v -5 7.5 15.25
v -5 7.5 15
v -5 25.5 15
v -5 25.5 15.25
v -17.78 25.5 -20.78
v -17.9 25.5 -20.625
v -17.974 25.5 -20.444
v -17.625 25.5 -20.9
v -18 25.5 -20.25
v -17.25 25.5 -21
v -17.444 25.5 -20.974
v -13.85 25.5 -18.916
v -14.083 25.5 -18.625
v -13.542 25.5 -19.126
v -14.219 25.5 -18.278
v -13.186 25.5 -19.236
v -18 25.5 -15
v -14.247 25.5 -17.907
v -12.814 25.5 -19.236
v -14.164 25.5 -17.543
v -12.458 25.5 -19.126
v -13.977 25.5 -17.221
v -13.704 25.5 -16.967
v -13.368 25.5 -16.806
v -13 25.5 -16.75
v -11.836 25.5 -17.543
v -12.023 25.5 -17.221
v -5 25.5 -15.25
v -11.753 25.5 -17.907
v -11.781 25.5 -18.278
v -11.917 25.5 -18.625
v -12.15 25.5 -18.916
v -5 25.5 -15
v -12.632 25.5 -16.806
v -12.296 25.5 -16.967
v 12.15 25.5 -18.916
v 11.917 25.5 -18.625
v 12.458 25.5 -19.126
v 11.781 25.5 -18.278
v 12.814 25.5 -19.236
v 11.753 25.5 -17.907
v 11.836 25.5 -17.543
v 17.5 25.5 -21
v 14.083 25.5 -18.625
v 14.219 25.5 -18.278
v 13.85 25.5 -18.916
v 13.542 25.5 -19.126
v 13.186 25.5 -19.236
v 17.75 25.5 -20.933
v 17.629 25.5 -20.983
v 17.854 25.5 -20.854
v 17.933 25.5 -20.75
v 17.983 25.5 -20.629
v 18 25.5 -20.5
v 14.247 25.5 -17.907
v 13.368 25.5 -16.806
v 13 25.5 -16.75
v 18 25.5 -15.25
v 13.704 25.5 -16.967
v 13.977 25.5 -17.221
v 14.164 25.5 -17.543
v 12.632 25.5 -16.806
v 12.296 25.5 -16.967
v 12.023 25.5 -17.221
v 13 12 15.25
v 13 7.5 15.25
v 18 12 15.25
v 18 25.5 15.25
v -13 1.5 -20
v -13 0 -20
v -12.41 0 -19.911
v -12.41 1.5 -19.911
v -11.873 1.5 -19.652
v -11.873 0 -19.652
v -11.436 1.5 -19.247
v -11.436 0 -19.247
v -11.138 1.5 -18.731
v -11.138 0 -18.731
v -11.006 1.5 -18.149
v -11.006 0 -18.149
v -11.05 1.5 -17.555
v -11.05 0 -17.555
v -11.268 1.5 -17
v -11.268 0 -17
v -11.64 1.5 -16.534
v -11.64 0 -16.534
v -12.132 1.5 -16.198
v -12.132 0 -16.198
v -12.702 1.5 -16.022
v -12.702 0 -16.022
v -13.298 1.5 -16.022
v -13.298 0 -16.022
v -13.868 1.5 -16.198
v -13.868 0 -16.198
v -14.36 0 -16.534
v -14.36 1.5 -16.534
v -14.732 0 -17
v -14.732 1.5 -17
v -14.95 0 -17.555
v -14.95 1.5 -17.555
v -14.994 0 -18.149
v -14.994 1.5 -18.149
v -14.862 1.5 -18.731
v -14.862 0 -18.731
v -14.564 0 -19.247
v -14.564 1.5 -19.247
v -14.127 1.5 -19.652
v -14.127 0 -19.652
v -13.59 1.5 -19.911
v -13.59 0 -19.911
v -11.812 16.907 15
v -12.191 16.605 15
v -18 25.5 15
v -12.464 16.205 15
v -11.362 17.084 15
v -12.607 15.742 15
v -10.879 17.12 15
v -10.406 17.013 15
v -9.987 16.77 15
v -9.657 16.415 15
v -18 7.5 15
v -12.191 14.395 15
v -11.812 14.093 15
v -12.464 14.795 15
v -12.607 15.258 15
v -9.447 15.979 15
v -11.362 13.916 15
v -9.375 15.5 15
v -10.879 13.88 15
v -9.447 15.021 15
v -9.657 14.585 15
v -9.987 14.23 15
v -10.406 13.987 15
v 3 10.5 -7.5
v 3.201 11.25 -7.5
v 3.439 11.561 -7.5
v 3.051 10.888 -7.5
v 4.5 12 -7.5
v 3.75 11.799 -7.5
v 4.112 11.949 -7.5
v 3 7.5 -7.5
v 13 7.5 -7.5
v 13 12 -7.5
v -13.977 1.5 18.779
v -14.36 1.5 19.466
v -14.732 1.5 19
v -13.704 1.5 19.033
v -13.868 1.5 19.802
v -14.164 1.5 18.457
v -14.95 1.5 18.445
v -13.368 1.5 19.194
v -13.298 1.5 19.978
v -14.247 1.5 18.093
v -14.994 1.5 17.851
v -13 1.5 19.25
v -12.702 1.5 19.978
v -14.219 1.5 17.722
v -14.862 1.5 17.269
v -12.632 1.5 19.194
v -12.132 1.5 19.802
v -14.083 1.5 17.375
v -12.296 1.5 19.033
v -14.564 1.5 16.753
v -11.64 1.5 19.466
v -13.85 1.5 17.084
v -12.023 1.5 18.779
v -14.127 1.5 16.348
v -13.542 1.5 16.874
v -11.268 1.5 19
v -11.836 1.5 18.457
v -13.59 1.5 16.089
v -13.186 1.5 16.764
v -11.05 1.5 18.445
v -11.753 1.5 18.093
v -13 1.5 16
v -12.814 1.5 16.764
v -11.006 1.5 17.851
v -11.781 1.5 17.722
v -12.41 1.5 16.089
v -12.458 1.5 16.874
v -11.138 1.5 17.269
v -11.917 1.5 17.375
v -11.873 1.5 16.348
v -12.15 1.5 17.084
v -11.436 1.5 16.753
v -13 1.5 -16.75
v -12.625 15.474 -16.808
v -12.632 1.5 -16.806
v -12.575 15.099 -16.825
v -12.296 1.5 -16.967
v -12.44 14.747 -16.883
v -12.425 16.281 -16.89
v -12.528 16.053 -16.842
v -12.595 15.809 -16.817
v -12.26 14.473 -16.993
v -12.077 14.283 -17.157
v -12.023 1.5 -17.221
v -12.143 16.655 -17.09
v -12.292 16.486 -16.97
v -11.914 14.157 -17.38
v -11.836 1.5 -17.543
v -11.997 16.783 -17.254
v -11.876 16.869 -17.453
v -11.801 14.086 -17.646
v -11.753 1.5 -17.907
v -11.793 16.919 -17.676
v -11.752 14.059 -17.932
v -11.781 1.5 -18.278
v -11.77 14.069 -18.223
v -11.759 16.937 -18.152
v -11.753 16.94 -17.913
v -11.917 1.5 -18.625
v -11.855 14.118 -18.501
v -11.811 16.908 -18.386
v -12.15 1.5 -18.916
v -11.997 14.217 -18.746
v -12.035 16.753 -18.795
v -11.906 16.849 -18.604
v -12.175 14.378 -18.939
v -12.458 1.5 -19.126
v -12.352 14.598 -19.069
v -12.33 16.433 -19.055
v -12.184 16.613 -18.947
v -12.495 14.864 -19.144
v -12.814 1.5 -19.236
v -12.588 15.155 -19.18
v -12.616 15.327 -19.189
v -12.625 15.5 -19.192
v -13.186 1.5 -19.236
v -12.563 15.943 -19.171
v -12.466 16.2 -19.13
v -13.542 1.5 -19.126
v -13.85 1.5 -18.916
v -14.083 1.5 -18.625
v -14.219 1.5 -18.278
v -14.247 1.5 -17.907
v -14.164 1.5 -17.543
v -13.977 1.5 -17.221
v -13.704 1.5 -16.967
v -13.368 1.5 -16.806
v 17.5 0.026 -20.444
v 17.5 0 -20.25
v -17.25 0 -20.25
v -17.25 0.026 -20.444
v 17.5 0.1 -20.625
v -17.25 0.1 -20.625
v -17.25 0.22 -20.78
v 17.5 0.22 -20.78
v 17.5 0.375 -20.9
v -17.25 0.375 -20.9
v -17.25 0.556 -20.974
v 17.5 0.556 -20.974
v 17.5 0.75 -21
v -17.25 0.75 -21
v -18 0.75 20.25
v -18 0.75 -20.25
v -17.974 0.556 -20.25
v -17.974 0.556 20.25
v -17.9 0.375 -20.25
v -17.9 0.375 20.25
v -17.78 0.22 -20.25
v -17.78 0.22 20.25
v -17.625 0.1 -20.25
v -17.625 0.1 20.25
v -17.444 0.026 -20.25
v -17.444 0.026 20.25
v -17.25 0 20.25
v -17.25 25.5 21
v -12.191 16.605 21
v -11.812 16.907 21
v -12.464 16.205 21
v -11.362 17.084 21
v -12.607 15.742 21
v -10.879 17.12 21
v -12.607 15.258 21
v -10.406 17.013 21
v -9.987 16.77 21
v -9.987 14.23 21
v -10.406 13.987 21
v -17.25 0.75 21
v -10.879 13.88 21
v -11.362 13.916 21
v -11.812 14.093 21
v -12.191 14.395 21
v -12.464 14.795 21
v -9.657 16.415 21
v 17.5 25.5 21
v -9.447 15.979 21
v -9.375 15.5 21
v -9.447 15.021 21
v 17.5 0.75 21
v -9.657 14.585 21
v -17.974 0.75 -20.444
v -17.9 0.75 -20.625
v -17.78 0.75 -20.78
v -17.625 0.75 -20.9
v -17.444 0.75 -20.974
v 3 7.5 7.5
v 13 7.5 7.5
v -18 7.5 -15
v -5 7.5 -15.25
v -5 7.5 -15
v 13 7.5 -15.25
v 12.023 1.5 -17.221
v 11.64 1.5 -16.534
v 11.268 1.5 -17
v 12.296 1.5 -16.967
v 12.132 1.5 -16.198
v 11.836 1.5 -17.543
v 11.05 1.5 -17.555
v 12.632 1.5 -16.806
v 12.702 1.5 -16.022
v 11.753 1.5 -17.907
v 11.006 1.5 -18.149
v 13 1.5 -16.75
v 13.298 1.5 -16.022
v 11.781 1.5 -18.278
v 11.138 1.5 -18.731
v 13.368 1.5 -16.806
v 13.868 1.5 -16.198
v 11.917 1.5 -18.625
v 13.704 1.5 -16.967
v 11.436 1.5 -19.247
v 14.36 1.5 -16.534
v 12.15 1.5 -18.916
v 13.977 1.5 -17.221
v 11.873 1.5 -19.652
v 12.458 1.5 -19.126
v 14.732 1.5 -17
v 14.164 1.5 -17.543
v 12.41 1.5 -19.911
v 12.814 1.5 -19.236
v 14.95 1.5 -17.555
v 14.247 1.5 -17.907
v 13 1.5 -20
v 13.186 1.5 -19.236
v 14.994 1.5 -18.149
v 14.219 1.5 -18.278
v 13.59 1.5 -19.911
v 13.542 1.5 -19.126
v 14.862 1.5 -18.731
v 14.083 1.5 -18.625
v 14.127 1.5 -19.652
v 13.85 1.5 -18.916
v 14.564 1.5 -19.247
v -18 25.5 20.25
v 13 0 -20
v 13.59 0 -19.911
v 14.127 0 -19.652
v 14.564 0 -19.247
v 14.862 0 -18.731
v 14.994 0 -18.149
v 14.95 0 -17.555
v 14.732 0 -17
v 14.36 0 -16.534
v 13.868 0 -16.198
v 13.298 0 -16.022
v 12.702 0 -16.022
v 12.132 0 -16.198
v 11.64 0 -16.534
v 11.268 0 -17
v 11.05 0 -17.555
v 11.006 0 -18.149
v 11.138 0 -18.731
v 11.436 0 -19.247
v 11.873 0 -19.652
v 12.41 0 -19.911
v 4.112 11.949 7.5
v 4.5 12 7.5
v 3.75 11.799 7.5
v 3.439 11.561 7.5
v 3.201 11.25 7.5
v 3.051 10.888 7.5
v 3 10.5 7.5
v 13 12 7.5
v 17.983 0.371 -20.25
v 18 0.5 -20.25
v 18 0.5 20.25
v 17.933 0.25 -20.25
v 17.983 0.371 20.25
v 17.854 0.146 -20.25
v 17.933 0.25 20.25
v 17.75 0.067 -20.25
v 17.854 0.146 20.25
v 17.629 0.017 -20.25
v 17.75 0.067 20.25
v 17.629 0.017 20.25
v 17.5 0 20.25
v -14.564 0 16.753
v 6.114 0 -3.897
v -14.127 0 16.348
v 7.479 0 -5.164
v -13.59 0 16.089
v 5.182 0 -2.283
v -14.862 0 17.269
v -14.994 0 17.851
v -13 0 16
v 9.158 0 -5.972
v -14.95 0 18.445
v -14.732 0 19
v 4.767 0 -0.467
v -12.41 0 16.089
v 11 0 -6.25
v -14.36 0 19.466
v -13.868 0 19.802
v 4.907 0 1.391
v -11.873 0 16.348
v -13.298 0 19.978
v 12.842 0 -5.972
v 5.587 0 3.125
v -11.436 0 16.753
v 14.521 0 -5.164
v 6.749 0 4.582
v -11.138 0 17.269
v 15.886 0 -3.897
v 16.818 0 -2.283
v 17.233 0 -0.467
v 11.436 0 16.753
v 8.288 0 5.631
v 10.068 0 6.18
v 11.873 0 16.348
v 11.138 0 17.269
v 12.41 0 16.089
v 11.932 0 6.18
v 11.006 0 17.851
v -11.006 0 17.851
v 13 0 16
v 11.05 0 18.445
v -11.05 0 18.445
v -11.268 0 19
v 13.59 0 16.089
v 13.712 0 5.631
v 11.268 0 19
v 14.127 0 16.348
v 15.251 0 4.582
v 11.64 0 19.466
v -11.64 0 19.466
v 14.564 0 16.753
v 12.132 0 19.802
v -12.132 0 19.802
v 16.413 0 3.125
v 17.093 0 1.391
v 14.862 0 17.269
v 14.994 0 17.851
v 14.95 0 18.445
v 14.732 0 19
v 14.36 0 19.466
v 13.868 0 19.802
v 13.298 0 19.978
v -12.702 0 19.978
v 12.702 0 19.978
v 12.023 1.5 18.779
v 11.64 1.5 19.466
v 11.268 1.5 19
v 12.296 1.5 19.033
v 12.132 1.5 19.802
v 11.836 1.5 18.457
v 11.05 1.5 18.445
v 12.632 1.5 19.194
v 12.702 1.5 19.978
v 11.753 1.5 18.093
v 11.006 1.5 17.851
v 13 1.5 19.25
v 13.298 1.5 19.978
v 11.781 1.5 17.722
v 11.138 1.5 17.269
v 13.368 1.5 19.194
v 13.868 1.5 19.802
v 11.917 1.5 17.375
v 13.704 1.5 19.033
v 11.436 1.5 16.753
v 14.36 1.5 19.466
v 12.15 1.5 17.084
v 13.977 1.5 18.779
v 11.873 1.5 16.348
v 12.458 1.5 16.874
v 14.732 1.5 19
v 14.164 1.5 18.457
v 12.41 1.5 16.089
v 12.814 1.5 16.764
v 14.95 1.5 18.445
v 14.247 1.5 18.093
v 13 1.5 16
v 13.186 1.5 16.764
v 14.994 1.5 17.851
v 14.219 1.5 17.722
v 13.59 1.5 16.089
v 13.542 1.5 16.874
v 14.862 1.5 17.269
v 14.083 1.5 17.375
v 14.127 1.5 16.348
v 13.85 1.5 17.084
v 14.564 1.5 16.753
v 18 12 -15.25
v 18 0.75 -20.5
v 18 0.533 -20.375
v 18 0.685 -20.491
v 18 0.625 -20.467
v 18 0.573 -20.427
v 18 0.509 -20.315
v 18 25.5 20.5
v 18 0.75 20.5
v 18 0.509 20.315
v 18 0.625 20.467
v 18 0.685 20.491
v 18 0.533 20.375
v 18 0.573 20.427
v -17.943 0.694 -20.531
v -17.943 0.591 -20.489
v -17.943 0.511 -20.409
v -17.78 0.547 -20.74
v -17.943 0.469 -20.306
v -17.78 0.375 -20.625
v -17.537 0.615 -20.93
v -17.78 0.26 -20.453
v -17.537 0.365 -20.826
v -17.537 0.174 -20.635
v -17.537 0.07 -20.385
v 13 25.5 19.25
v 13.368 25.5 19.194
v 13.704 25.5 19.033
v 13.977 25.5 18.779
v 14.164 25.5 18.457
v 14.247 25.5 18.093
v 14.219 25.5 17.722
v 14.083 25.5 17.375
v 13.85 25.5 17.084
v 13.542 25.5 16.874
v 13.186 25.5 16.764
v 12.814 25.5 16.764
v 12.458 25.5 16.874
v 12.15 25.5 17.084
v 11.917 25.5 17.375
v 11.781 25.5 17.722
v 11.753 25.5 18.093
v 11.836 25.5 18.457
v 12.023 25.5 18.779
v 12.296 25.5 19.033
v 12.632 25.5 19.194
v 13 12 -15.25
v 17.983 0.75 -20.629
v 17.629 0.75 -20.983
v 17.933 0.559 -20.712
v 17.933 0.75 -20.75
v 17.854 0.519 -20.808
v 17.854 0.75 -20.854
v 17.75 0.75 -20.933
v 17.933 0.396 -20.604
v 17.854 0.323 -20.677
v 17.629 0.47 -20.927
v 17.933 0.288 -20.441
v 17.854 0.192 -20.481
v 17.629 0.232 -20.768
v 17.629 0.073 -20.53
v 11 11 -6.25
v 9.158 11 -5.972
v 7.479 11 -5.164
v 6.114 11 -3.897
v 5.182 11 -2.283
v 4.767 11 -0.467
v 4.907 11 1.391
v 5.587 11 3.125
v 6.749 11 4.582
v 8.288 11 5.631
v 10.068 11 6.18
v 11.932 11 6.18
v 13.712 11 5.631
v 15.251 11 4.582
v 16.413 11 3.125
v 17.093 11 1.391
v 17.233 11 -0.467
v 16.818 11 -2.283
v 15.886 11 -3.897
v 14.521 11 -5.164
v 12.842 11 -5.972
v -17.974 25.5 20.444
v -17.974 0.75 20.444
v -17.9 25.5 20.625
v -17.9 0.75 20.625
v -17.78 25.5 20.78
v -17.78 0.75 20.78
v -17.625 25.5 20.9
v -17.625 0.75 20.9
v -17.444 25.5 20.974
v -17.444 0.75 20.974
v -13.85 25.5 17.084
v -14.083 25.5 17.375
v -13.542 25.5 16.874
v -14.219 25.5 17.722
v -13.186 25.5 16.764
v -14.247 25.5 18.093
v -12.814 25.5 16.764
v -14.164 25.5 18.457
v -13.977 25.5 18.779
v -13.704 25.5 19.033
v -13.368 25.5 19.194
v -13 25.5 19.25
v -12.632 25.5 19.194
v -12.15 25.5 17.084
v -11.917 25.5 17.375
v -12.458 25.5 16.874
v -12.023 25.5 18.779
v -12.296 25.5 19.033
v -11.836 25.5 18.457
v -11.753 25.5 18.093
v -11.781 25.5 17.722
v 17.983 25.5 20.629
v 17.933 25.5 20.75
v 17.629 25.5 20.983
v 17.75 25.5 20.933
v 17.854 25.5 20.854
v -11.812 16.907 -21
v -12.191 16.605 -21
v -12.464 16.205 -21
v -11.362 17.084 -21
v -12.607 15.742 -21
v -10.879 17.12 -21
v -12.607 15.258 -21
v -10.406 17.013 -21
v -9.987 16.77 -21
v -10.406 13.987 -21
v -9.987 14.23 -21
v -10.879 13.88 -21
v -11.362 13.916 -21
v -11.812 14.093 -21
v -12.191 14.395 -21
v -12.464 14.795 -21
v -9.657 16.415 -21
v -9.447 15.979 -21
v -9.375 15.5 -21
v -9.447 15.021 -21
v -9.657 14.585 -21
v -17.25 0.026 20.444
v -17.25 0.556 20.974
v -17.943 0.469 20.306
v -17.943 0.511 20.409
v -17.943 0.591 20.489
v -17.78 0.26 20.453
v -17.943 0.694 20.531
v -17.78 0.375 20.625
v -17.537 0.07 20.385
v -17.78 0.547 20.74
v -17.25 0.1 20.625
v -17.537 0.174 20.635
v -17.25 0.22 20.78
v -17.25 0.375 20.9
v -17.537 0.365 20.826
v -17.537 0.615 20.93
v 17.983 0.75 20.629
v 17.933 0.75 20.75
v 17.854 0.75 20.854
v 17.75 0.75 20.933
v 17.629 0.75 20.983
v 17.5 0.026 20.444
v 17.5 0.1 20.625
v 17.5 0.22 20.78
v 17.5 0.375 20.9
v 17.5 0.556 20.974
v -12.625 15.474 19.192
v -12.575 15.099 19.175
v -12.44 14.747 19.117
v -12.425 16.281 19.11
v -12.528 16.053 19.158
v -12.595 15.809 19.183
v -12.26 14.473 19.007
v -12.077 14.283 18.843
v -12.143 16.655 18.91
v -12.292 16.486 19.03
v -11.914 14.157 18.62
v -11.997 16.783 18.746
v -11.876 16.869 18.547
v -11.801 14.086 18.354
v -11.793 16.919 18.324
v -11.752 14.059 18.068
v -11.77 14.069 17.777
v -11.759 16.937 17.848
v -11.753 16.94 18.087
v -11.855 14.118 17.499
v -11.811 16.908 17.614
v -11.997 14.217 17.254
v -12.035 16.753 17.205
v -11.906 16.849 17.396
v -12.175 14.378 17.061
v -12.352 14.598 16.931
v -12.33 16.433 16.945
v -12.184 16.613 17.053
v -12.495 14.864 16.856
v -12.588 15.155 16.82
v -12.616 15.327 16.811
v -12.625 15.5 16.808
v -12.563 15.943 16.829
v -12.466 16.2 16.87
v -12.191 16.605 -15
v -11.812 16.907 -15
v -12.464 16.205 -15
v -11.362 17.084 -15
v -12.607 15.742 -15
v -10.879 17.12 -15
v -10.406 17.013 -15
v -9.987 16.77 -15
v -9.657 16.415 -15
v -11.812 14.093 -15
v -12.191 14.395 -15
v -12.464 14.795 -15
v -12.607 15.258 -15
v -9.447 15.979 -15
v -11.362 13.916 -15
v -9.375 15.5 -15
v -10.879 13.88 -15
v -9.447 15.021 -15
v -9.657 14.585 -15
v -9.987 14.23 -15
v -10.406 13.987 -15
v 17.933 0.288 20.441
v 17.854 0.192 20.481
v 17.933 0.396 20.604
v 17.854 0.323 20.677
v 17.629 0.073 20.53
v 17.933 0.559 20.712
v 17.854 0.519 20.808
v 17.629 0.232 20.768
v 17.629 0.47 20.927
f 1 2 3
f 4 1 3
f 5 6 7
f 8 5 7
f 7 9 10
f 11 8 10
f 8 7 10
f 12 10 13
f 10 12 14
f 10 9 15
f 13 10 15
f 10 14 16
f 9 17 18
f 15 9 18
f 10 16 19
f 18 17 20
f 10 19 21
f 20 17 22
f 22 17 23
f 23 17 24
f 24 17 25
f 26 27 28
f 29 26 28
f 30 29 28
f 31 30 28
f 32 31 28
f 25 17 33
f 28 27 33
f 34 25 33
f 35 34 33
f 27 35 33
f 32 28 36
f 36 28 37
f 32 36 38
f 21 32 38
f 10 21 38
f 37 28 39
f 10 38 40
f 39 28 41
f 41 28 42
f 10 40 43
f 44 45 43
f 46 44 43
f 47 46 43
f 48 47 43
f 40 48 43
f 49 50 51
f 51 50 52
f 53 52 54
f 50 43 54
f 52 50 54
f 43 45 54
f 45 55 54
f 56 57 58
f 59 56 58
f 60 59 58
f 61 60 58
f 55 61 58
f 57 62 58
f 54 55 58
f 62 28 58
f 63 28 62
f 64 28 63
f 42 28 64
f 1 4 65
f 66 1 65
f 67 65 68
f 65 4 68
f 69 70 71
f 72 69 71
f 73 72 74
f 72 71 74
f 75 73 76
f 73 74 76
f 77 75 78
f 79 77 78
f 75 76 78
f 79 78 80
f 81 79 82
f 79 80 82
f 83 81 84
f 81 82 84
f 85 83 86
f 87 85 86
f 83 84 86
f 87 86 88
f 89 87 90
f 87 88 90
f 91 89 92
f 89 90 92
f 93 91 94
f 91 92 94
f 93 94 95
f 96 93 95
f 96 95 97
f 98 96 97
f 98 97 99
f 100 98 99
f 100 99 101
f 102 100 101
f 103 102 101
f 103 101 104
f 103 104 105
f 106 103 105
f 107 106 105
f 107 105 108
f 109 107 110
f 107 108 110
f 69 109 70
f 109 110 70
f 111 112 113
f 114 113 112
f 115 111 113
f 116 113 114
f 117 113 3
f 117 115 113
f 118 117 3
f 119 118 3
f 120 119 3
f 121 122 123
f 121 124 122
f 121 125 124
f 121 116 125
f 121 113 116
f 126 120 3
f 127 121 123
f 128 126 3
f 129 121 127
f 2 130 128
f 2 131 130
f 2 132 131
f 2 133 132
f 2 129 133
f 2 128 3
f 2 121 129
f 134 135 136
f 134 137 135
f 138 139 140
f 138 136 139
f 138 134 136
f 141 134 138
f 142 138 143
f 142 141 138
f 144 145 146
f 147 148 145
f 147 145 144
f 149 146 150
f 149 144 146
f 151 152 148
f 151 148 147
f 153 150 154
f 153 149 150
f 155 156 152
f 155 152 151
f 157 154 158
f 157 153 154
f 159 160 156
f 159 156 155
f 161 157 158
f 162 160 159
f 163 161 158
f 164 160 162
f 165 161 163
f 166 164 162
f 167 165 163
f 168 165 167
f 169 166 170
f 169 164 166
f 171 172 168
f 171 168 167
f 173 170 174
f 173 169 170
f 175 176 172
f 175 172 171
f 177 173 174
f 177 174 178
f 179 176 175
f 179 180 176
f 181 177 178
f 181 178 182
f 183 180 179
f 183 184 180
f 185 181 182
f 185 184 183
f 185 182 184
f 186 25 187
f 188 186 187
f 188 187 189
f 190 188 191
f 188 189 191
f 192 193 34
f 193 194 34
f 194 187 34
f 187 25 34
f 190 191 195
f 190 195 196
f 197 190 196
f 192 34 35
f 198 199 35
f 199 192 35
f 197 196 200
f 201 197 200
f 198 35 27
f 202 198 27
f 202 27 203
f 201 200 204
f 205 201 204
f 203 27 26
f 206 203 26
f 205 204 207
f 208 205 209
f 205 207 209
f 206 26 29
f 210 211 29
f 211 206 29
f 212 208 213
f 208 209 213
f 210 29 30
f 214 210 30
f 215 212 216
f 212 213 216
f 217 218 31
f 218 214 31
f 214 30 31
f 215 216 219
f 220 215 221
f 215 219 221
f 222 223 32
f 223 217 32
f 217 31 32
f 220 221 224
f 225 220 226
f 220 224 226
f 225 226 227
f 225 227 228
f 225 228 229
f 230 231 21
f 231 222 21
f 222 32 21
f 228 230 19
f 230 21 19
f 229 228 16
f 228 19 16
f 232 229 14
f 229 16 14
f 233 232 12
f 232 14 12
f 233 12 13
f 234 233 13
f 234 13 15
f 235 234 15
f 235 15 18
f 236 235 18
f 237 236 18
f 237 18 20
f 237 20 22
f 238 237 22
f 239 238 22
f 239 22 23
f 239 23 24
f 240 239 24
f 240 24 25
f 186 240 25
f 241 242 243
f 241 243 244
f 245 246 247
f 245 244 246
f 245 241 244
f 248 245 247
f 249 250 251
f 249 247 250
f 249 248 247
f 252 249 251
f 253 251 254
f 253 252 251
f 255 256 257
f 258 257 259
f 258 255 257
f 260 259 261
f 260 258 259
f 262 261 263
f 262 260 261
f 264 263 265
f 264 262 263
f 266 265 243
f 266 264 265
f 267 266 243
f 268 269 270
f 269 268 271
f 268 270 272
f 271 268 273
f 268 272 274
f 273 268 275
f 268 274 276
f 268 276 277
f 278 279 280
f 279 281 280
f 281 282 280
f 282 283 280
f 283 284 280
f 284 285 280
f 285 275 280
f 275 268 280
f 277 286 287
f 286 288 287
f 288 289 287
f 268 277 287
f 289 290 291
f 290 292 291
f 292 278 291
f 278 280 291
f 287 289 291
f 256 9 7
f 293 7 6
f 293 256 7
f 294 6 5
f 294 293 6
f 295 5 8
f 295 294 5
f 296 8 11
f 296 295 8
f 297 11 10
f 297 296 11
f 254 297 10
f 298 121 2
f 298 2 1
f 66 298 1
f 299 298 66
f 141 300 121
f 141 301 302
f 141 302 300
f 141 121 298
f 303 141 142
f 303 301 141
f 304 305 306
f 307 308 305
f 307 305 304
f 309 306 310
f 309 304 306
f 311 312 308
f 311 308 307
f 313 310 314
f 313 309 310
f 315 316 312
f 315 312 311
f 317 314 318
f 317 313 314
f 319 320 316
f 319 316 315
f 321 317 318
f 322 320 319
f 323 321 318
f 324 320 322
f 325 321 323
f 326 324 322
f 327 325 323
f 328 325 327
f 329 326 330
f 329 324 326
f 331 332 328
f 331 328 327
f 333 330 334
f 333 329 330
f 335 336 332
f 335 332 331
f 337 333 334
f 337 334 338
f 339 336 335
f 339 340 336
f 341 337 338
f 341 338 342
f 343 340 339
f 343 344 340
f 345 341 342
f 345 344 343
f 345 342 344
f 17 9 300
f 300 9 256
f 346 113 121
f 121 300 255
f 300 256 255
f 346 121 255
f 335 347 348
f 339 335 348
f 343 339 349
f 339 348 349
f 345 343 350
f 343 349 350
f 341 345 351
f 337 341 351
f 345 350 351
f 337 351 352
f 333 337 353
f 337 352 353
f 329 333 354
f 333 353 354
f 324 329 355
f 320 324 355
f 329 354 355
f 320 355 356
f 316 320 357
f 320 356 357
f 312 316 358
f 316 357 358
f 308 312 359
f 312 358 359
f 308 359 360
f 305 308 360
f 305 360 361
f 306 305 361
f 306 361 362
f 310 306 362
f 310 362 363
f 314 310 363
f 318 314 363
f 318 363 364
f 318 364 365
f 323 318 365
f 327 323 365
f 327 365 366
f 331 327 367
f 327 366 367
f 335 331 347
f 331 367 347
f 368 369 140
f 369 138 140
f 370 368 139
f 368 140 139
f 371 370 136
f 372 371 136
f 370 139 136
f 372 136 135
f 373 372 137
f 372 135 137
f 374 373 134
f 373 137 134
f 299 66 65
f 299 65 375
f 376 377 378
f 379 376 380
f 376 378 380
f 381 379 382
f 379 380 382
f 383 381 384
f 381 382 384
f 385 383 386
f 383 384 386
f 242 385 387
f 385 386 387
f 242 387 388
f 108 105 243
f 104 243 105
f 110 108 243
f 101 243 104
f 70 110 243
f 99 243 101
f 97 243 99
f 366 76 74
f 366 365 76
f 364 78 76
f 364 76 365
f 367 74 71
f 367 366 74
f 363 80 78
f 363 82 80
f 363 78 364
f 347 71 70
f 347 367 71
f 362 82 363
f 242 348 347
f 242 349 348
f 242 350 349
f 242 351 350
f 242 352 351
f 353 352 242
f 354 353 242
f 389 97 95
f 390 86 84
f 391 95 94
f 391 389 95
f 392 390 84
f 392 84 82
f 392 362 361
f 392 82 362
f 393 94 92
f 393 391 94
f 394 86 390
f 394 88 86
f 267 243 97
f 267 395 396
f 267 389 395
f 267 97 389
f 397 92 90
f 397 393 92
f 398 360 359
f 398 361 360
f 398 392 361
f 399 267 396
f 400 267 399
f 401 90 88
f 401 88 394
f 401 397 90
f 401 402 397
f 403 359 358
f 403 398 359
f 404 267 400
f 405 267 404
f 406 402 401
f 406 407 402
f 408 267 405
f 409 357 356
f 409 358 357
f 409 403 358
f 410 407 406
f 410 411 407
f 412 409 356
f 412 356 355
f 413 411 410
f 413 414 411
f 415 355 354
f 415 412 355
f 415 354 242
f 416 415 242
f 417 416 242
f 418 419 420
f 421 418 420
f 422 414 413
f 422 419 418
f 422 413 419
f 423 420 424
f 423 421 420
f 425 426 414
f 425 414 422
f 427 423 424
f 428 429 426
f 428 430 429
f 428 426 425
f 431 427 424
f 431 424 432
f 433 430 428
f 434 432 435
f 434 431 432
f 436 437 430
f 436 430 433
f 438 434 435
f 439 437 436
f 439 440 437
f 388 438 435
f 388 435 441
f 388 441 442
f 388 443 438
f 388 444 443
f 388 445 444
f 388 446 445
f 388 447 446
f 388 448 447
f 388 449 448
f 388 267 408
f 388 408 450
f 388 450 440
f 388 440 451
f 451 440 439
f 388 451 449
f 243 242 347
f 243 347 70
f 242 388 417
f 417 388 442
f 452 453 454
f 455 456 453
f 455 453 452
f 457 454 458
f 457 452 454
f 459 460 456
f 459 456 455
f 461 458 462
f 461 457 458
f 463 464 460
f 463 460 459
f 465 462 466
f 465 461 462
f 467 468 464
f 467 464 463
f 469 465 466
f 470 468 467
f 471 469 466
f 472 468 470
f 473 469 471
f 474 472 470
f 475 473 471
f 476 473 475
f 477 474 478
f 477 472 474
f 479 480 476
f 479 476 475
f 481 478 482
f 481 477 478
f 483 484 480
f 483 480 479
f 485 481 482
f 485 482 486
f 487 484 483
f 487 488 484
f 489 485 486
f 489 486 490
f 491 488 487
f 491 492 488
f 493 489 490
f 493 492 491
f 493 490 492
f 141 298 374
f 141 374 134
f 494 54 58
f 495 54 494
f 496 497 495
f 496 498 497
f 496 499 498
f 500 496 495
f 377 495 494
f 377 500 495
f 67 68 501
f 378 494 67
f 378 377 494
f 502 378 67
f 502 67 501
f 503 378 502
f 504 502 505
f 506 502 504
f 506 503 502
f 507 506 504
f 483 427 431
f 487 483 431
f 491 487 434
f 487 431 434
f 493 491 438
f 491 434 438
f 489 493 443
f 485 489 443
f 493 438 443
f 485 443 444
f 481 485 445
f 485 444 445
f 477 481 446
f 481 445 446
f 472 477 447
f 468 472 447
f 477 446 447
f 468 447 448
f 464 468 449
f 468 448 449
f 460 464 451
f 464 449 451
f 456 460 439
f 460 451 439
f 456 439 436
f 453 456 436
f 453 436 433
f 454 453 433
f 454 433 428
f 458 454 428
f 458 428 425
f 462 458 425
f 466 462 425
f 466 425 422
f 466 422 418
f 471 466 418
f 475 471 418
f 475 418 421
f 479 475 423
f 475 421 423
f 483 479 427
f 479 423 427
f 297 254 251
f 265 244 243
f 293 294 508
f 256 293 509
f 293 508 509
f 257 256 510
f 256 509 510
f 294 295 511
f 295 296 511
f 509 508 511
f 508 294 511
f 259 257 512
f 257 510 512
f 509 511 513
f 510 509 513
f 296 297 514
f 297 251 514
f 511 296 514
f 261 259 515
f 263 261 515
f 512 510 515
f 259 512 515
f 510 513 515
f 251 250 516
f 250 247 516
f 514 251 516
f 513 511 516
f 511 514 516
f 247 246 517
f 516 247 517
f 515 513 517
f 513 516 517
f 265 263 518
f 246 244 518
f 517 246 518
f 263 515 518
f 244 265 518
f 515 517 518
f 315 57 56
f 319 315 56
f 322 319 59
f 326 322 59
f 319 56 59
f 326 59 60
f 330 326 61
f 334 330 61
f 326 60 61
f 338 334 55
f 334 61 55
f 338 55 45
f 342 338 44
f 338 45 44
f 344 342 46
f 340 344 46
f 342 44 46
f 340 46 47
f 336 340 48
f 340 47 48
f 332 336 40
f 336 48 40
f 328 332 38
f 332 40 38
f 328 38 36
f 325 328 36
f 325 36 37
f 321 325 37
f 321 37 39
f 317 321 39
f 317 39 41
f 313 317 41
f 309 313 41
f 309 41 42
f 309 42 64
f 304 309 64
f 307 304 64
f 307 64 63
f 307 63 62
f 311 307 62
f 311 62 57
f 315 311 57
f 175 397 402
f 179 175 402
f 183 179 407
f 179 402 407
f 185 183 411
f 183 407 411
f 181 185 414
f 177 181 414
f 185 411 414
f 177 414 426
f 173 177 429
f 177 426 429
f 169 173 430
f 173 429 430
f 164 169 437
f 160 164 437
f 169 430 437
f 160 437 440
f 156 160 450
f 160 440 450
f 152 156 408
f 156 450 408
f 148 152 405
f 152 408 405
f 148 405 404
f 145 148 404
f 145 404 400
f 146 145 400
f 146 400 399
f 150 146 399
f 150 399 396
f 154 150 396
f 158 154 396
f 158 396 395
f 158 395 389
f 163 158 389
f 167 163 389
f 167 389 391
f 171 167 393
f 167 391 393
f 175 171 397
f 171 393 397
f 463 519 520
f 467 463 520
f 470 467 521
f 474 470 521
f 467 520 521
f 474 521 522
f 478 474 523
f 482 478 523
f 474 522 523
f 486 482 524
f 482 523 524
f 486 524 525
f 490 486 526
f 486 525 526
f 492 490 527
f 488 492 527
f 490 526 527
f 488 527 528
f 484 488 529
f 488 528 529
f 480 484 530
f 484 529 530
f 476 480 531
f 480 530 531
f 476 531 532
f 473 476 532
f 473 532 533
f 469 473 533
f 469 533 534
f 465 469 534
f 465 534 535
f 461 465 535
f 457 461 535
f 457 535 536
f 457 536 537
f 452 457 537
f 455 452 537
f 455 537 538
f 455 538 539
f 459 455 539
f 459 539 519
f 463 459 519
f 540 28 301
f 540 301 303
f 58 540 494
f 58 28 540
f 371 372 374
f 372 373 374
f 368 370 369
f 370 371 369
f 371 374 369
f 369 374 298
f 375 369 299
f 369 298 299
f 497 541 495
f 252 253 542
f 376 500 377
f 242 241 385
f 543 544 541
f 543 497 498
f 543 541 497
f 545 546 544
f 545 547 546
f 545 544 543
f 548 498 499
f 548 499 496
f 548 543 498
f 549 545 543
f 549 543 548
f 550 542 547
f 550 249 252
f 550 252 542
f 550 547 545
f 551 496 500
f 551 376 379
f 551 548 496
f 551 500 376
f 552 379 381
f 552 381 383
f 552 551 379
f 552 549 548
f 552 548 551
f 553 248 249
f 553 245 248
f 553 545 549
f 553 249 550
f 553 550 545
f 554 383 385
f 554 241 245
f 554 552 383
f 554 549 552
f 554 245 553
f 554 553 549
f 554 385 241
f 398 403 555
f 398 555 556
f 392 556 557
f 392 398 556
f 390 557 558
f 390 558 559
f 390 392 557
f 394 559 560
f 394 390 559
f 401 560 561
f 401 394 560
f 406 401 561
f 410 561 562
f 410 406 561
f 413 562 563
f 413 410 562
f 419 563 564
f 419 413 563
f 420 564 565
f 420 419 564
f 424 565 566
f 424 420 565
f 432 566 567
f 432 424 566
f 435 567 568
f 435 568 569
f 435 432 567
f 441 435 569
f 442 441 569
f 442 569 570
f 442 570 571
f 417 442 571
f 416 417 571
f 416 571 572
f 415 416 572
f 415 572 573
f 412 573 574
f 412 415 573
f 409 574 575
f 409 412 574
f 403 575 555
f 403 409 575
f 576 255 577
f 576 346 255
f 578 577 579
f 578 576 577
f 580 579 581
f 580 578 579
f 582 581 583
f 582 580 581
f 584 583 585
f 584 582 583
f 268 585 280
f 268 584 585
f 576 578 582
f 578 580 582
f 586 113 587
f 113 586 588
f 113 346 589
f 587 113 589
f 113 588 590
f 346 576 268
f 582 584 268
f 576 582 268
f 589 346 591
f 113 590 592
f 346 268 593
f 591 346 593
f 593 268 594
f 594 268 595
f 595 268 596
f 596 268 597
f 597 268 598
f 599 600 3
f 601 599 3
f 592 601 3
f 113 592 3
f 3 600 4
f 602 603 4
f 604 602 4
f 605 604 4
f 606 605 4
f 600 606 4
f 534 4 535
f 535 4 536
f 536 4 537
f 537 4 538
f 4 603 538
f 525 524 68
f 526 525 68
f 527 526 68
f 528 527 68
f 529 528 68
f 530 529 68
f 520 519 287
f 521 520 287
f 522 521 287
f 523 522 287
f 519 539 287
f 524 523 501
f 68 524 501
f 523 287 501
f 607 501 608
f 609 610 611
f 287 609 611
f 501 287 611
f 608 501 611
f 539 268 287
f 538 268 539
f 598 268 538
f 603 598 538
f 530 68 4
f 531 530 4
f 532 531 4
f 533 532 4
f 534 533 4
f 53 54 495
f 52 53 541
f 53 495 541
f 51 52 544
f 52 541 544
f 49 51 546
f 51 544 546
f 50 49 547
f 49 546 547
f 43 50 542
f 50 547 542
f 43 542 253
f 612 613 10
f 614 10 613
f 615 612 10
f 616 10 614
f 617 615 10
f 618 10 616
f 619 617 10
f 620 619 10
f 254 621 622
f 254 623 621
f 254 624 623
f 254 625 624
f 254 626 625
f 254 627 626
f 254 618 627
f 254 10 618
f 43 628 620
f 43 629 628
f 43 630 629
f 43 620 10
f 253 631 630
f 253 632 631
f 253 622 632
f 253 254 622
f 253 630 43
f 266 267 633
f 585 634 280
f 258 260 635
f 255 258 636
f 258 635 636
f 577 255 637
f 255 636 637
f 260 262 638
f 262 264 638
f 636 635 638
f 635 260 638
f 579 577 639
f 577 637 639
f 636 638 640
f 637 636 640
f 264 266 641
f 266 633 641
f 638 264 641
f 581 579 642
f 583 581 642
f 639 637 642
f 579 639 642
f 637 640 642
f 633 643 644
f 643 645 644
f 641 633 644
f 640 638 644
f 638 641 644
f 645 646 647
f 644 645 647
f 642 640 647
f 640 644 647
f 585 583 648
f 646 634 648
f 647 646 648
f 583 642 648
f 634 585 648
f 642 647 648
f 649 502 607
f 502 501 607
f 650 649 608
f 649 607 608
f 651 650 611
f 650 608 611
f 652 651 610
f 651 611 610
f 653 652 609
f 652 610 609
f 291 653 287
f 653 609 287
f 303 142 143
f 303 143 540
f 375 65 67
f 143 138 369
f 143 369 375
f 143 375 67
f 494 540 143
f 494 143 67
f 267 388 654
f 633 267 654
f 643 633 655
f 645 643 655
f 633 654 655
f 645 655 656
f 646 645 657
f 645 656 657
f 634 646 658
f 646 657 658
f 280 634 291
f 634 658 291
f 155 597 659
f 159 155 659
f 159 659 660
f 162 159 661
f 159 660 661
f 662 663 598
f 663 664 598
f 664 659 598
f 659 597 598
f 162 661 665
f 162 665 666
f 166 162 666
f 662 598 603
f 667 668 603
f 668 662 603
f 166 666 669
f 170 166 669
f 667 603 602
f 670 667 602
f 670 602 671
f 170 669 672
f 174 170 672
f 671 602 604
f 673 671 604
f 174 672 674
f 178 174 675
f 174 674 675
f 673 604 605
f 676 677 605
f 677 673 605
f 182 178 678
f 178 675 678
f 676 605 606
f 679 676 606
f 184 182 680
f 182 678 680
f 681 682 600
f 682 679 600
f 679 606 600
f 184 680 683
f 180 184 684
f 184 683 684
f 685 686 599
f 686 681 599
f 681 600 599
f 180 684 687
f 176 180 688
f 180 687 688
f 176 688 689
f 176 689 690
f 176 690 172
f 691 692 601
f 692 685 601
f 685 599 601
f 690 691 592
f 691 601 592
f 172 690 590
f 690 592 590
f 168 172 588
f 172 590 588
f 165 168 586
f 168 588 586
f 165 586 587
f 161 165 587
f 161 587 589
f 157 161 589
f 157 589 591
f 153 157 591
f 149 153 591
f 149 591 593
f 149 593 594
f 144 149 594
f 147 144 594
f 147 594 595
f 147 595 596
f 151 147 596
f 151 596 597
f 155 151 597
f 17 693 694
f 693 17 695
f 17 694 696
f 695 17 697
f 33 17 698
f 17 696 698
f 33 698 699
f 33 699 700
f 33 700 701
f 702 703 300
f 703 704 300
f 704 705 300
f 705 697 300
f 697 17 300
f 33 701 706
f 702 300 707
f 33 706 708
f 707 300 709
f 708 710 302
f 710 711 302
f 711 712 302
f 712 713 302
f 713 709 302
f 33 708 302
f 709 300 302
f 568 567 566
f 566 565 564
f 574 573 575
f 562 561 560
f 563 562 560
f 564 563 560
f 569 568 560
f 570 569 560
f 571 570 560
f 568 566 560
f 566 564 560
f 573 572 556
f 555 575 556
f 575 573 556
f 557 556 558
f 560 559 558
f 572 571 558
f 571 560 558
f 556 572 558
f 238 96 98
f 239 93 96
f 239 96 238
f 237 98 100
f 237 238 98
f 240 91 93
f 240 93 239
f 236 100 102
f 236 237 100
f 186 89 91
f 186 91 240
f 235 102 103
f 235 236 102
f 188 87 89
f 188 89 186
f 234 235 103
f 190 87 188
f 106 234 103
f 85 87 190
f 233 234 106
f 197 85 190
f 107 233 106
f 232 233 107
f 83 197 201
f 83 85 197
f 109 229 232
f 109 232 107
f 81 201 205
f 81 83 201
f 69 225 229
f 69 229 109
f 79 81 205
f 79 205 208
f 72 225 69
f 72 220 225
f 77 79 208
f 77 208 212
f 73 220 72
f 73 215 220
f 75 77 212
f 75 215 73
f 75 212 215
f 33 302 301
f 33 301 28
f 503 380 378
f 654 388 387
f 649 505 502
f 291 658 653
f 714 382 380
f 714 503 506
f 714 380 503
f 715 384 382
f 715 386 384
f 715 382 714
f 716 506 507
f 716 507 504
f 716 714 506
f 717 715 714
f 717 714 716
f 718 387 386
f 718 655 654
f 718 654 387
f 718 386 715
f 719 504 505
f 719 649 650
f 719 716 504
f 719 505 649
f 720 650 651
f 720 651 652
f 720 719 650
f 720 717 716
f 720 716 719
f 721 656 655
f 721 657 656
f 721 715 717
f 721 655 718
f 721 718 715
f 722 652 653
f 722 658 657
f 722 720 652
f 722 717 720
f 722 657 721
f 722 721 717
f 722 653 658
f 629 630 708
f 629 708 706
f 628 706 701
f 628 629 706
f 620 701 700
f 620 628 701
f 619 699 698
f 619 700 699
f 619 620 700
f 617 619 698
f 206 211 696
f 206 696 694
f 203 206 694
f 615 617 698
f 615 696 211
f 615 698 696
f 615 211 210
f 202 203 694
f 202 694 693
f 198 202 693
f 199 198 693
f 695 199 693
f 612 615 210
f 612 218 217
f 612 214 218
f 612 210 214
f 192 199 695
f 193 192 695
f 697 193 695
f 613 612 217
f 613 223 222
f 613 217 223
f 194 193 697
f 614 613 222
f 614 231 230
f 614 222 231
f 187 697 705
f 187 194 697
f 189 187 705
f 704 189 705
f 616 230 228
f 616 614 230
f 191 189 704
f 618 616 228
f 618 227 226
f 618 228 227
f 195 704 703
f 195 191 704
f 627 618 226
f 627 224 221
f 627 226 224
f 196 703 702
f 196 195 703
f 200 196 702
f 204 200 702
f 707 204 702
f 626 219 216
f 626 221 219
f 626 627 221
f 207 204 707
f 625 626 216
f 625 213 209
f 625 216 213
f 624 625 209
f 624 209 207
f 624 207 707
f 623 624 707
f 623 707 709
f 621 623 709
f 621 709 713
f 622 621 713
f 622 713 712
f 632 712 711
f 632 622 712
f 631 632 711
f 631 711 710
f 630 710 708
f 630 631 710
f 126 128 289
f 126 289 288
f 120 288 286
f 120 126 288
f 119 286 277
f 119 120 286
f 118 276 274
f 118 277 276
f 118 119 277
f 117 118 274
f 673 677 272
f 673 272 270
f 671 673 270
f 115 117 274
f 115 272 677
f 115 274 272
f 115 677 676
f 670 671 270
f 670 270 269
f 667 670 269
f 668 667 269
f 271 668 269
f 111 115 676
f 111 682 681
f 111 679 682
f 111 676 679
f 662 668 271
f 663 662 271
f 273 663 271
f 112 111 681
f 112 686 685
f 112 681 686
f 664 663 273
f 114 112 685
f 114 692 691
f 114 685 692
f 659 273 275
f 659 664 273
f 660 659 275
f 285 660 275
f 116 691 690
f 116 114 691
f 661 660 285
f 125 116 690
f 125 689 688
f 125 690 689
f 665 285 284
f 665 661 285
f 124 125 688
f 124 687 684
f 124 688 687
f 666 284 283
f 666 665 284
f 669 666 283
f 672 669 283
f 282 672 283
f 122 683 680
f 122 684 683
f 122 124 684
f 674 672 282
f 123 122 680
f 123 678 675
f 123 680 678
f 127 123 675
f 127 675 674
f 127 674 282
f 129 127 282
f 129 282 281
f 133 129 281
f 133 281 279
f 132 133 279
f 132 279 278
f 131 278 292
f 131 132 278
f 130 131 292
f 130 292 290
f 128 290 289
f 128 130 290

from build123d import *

# Parameters (mm, degrees)
SKETCH1_W               = 36
SKETCH1_H               = 30
BASE_PLATE_DEPTH        = 7.5
SKETCH2_W               = 36
SKETCH2_H               = 6
SIDE_WALLS_DEPTH        = 25.5
SKETCH4_R               = 1.25
M2_SCREWS_DEPTH         = 25.5
SKETCH6_W               = 5
SKETCH6_H               = 30
RETURN_STOPPER_DEPTH    = 4.5
SKETCH9_W               = 10
SKETCH9_H               = 15
BOSS_EXTRUDE1_DEPTH     = 4.5
SKETCH7_R               = 6.25
MAGNET_POCKET_DEPTH     = 11
SKETCH8_R               = 2
M2_SCREW_HEAD_DEPTH     = 1.5
M3_ACHSE_DEPTH          = 48.647140523
M3_ACHSE_DEPTH_BACK     = 48.647140523
SKETCH5_R               = 1.625
FILLET1_R               = 1.5
LEAVER_SPACE_DEPTH      = 30.25
LEAVER_SPACE_DEPTH_BACK = 0.25
SKETCH11_W              = 23
SKETCH11_H              = 13.5
SKETCH12_W              = 18
SKETCH12_H              = 4.5
MORE_SPACE_LEFT_DEPTH   = 0.25
SKETCH13_W              = 18
SKETCH13_H              = 4.5
MORE_SPACE_RIGHT_DEPTH  = 0.25
FILLET2_R               = 0.75
FILLET3_R               = 0.75
FILLET4_R               = 0.75
FILLET5_R               = 0.5


with BuildPart() as part:
    # Sketch1 → Base Plate (new body)
    with BuildSketch(Plane(origin=(0, 0, 0), x_dir=(1, 0, 0), z_dir=(0, 1, 0))):
        Rectangle(SKETCH1_W, SKETCH1_H)
    extrude(amount=BASE_PLATE_DEPTH)

    # Sketch2 → Side Walls (add)
    with BuildSketch(Plane.XZ):
        with Locations((0, -18)):
            Rectangle(SKETCH2_W, SKETCH2_H)
        with Locations((0, 18)):
            Rectangle(SKETCH2_W, SKETCH2_H)
    extrude(amount=-SIDE_WALLS_DEPTH)

    # Sketch4 → M2 Screws (cut)
    with BuildSketch(Plane(origin=(0, 25.5, 0), x_dir=(1, 0, 0), z_dir=(0, 1, 0))):
        with Locations(Location((-13, -18, 0), (0, 0, 270))):
            Circle(SKETCH4_R)
        with Locations(Location((13, -18, 0), (0, 0, 270))):
            Circle(SKETCH4_R)
        with Locations(Location((13, 18, 0), (0, 0, 270))):
            Circle(SKETCH4_R)
        with Locations(Location((-13, 18, 0), (0, 0, 270))):
            Circle(SKETCH4_R)
    extrude(amount=-M2_SCREWS_DEPTH, mode=Mode.SUBTRACT)

    # Sketch6 → Return Stopper (add)
    with BuildSketch(Plane(origin=(0, 7.5, 0), x_dir=(1, 0, 0), z_dir=(0, 1, 0))):
        with Locations((15.5, 0)):
            Rectangle(SKETCH6_W, SKETCH6_H)
    extrude(amount=RETURN_STOPPER_DEPTH)

    # Sketch9 → Boss-Extrude1 (add)
    with BuildSketch(Plane(origin=(0, 7.5, 0), x_dir=(1, 0, 0), z_dir=(0, 1, 0))):
        with Locations((8, 0)):
            Rectangle(SKETCH9_W, SKETCH9_H)
    extrude(amount=BOSS_EXTRUDE1_DEPTH)

    # Sketch7 → Magnet Pocket (cut)
    with BuildSketch(Plane(origin=(0, 0, 0), x_dir=(-1, 0, 0), z_dir=(0, 1, 0))):
        with Locations(Location((-11, 0, 0), (0, 0, 270))):
            Circle(SKETCH7_R)
    extrude(amount=MAGNET_POCKET_DEPTH, mode=Mode.SUBTRACT)

    # Sketch8 → M2 Screw Head (cut)
    with BuildSketch(Plane.XZ):
        with Locations(Location((13, -18, 0), (0, 0, 270))):
            Circle(SKETCH8_R)
        with Locations(Location((-13, -18, 0), (0, 0, 270))):
            Circle(SKETCH8_R)
        with Locations(Location((13, 18, 0), (0, 0, 270))):
            Circle(SKETCH8_R)
        with Locations(Location((-13, 18, 0), (0, 0, 270))):
            Circle(SKETCH8_R)
    extrude(amount=-M2_SCREW_HEAD_DEPTH, mode=Mode.SUBTRACT)

    # Sketch5 → M3 Achse (cut, two sides: drawn at the far end of the back side and taken through both)
    with BuildSketch(Plane.XY.offset(-15).offset(-M3_ACHSE_DEPTH_BACK)):
        with Locations((-11, 15.5)):
            Circle(SKETCH5_R)
    extrude(amount=M3_ACHSE_DEPTH + M3_ACHSE_DEPTH_BACK, mode=Mode.SUBTRACT)

    # Fillet1
    fillet1_edges = [part.edges().sort_by_distance(p)[0] for p in [
        (3, 12, 0),
    ]]
    fillet(fillet1_edges, radius=FILLET1_R)

    # Sketch11 → Leaver Space (cut, two sides: drawn at the far end of the back side and taken through both)
    with BuildSketch(Plane.XY.offset(-15).offset(-LEAVER_SPACE_DEPTH_BACK)):
        with Locations((6.5, 18.75)):
            Rectangle(SKETCH11_W, SKETCH11_H)
    extrude(amount=LEAVER_SPACE_DEPTH + LEAVER_SPACE_DEPTH_BACK, mode=Mode.SUBTRACT)

    # Sketch12 → More Space left (cut)
    with BuildSketch(Plane.XY.offset(-15)):
        with Locations((4, 9.75)):
            Rectangle(SKETCH12_W, SKETCH12_H)
    extrude(amount=-MORE_SPACE_LEFT_DEPTH, mode=Mode.SUBTRACT)

    # Sketch13 → More Space right (cut)
    with BuildSketch(Plane(origin=(0, 0, 15), x_dir=(-1, 0, 0), z_dir=(0, 0, -1))):
        with Locations((-4, 9.75)):
            Rectangle(SKETCH13_W, SKETCH13_H)
    extrude(amount=-MORE_SPACE_RIGHT_DEPTH, mode=Mode.SUBTRACT)

    # Fillet2
    fillet2_edges = [part.edges().sort_by_distance(p)[0] for p in [
        (0, 0, -21),
    ]]
    fillet(fillet2_edges, radius=FILLET2_R)

    # Fillet3
    fillet3_edges = [part.edges().sort_by_distance(p)[0] for p in [
        (0, 0, 21),
    ]]
    fillet(fillet3_edges, radius=FILLET3_R)

    # Fillet4
    fillet4_edges = [part.edges().sort_by_distance(p)[0] for p in [
        (-18, 13.125, 21),
        (-18, 0, 0),
        (-18, 0.219669914, -20.780330086),
        (-18, 0.219669914, 20.780330086),
        (-18, 13.125, -21),
    ]]
    fillet(fillet4_edges, radius=FILLET4_R)

    # Fillet5
    fillet5_edges = [part.edges().sort_by_distance(p)[0] for p in [
        (18, 13.125, 21),
        (18, 0.219669914, -20.780330086),
        (18, 0, 0),
        (18, 0.219669914, 20.780330086),
        (18, 13.125, -21),
    ]]
    fillet(fillet5_edges, radius=FILLET5_R)


solid = part.part
